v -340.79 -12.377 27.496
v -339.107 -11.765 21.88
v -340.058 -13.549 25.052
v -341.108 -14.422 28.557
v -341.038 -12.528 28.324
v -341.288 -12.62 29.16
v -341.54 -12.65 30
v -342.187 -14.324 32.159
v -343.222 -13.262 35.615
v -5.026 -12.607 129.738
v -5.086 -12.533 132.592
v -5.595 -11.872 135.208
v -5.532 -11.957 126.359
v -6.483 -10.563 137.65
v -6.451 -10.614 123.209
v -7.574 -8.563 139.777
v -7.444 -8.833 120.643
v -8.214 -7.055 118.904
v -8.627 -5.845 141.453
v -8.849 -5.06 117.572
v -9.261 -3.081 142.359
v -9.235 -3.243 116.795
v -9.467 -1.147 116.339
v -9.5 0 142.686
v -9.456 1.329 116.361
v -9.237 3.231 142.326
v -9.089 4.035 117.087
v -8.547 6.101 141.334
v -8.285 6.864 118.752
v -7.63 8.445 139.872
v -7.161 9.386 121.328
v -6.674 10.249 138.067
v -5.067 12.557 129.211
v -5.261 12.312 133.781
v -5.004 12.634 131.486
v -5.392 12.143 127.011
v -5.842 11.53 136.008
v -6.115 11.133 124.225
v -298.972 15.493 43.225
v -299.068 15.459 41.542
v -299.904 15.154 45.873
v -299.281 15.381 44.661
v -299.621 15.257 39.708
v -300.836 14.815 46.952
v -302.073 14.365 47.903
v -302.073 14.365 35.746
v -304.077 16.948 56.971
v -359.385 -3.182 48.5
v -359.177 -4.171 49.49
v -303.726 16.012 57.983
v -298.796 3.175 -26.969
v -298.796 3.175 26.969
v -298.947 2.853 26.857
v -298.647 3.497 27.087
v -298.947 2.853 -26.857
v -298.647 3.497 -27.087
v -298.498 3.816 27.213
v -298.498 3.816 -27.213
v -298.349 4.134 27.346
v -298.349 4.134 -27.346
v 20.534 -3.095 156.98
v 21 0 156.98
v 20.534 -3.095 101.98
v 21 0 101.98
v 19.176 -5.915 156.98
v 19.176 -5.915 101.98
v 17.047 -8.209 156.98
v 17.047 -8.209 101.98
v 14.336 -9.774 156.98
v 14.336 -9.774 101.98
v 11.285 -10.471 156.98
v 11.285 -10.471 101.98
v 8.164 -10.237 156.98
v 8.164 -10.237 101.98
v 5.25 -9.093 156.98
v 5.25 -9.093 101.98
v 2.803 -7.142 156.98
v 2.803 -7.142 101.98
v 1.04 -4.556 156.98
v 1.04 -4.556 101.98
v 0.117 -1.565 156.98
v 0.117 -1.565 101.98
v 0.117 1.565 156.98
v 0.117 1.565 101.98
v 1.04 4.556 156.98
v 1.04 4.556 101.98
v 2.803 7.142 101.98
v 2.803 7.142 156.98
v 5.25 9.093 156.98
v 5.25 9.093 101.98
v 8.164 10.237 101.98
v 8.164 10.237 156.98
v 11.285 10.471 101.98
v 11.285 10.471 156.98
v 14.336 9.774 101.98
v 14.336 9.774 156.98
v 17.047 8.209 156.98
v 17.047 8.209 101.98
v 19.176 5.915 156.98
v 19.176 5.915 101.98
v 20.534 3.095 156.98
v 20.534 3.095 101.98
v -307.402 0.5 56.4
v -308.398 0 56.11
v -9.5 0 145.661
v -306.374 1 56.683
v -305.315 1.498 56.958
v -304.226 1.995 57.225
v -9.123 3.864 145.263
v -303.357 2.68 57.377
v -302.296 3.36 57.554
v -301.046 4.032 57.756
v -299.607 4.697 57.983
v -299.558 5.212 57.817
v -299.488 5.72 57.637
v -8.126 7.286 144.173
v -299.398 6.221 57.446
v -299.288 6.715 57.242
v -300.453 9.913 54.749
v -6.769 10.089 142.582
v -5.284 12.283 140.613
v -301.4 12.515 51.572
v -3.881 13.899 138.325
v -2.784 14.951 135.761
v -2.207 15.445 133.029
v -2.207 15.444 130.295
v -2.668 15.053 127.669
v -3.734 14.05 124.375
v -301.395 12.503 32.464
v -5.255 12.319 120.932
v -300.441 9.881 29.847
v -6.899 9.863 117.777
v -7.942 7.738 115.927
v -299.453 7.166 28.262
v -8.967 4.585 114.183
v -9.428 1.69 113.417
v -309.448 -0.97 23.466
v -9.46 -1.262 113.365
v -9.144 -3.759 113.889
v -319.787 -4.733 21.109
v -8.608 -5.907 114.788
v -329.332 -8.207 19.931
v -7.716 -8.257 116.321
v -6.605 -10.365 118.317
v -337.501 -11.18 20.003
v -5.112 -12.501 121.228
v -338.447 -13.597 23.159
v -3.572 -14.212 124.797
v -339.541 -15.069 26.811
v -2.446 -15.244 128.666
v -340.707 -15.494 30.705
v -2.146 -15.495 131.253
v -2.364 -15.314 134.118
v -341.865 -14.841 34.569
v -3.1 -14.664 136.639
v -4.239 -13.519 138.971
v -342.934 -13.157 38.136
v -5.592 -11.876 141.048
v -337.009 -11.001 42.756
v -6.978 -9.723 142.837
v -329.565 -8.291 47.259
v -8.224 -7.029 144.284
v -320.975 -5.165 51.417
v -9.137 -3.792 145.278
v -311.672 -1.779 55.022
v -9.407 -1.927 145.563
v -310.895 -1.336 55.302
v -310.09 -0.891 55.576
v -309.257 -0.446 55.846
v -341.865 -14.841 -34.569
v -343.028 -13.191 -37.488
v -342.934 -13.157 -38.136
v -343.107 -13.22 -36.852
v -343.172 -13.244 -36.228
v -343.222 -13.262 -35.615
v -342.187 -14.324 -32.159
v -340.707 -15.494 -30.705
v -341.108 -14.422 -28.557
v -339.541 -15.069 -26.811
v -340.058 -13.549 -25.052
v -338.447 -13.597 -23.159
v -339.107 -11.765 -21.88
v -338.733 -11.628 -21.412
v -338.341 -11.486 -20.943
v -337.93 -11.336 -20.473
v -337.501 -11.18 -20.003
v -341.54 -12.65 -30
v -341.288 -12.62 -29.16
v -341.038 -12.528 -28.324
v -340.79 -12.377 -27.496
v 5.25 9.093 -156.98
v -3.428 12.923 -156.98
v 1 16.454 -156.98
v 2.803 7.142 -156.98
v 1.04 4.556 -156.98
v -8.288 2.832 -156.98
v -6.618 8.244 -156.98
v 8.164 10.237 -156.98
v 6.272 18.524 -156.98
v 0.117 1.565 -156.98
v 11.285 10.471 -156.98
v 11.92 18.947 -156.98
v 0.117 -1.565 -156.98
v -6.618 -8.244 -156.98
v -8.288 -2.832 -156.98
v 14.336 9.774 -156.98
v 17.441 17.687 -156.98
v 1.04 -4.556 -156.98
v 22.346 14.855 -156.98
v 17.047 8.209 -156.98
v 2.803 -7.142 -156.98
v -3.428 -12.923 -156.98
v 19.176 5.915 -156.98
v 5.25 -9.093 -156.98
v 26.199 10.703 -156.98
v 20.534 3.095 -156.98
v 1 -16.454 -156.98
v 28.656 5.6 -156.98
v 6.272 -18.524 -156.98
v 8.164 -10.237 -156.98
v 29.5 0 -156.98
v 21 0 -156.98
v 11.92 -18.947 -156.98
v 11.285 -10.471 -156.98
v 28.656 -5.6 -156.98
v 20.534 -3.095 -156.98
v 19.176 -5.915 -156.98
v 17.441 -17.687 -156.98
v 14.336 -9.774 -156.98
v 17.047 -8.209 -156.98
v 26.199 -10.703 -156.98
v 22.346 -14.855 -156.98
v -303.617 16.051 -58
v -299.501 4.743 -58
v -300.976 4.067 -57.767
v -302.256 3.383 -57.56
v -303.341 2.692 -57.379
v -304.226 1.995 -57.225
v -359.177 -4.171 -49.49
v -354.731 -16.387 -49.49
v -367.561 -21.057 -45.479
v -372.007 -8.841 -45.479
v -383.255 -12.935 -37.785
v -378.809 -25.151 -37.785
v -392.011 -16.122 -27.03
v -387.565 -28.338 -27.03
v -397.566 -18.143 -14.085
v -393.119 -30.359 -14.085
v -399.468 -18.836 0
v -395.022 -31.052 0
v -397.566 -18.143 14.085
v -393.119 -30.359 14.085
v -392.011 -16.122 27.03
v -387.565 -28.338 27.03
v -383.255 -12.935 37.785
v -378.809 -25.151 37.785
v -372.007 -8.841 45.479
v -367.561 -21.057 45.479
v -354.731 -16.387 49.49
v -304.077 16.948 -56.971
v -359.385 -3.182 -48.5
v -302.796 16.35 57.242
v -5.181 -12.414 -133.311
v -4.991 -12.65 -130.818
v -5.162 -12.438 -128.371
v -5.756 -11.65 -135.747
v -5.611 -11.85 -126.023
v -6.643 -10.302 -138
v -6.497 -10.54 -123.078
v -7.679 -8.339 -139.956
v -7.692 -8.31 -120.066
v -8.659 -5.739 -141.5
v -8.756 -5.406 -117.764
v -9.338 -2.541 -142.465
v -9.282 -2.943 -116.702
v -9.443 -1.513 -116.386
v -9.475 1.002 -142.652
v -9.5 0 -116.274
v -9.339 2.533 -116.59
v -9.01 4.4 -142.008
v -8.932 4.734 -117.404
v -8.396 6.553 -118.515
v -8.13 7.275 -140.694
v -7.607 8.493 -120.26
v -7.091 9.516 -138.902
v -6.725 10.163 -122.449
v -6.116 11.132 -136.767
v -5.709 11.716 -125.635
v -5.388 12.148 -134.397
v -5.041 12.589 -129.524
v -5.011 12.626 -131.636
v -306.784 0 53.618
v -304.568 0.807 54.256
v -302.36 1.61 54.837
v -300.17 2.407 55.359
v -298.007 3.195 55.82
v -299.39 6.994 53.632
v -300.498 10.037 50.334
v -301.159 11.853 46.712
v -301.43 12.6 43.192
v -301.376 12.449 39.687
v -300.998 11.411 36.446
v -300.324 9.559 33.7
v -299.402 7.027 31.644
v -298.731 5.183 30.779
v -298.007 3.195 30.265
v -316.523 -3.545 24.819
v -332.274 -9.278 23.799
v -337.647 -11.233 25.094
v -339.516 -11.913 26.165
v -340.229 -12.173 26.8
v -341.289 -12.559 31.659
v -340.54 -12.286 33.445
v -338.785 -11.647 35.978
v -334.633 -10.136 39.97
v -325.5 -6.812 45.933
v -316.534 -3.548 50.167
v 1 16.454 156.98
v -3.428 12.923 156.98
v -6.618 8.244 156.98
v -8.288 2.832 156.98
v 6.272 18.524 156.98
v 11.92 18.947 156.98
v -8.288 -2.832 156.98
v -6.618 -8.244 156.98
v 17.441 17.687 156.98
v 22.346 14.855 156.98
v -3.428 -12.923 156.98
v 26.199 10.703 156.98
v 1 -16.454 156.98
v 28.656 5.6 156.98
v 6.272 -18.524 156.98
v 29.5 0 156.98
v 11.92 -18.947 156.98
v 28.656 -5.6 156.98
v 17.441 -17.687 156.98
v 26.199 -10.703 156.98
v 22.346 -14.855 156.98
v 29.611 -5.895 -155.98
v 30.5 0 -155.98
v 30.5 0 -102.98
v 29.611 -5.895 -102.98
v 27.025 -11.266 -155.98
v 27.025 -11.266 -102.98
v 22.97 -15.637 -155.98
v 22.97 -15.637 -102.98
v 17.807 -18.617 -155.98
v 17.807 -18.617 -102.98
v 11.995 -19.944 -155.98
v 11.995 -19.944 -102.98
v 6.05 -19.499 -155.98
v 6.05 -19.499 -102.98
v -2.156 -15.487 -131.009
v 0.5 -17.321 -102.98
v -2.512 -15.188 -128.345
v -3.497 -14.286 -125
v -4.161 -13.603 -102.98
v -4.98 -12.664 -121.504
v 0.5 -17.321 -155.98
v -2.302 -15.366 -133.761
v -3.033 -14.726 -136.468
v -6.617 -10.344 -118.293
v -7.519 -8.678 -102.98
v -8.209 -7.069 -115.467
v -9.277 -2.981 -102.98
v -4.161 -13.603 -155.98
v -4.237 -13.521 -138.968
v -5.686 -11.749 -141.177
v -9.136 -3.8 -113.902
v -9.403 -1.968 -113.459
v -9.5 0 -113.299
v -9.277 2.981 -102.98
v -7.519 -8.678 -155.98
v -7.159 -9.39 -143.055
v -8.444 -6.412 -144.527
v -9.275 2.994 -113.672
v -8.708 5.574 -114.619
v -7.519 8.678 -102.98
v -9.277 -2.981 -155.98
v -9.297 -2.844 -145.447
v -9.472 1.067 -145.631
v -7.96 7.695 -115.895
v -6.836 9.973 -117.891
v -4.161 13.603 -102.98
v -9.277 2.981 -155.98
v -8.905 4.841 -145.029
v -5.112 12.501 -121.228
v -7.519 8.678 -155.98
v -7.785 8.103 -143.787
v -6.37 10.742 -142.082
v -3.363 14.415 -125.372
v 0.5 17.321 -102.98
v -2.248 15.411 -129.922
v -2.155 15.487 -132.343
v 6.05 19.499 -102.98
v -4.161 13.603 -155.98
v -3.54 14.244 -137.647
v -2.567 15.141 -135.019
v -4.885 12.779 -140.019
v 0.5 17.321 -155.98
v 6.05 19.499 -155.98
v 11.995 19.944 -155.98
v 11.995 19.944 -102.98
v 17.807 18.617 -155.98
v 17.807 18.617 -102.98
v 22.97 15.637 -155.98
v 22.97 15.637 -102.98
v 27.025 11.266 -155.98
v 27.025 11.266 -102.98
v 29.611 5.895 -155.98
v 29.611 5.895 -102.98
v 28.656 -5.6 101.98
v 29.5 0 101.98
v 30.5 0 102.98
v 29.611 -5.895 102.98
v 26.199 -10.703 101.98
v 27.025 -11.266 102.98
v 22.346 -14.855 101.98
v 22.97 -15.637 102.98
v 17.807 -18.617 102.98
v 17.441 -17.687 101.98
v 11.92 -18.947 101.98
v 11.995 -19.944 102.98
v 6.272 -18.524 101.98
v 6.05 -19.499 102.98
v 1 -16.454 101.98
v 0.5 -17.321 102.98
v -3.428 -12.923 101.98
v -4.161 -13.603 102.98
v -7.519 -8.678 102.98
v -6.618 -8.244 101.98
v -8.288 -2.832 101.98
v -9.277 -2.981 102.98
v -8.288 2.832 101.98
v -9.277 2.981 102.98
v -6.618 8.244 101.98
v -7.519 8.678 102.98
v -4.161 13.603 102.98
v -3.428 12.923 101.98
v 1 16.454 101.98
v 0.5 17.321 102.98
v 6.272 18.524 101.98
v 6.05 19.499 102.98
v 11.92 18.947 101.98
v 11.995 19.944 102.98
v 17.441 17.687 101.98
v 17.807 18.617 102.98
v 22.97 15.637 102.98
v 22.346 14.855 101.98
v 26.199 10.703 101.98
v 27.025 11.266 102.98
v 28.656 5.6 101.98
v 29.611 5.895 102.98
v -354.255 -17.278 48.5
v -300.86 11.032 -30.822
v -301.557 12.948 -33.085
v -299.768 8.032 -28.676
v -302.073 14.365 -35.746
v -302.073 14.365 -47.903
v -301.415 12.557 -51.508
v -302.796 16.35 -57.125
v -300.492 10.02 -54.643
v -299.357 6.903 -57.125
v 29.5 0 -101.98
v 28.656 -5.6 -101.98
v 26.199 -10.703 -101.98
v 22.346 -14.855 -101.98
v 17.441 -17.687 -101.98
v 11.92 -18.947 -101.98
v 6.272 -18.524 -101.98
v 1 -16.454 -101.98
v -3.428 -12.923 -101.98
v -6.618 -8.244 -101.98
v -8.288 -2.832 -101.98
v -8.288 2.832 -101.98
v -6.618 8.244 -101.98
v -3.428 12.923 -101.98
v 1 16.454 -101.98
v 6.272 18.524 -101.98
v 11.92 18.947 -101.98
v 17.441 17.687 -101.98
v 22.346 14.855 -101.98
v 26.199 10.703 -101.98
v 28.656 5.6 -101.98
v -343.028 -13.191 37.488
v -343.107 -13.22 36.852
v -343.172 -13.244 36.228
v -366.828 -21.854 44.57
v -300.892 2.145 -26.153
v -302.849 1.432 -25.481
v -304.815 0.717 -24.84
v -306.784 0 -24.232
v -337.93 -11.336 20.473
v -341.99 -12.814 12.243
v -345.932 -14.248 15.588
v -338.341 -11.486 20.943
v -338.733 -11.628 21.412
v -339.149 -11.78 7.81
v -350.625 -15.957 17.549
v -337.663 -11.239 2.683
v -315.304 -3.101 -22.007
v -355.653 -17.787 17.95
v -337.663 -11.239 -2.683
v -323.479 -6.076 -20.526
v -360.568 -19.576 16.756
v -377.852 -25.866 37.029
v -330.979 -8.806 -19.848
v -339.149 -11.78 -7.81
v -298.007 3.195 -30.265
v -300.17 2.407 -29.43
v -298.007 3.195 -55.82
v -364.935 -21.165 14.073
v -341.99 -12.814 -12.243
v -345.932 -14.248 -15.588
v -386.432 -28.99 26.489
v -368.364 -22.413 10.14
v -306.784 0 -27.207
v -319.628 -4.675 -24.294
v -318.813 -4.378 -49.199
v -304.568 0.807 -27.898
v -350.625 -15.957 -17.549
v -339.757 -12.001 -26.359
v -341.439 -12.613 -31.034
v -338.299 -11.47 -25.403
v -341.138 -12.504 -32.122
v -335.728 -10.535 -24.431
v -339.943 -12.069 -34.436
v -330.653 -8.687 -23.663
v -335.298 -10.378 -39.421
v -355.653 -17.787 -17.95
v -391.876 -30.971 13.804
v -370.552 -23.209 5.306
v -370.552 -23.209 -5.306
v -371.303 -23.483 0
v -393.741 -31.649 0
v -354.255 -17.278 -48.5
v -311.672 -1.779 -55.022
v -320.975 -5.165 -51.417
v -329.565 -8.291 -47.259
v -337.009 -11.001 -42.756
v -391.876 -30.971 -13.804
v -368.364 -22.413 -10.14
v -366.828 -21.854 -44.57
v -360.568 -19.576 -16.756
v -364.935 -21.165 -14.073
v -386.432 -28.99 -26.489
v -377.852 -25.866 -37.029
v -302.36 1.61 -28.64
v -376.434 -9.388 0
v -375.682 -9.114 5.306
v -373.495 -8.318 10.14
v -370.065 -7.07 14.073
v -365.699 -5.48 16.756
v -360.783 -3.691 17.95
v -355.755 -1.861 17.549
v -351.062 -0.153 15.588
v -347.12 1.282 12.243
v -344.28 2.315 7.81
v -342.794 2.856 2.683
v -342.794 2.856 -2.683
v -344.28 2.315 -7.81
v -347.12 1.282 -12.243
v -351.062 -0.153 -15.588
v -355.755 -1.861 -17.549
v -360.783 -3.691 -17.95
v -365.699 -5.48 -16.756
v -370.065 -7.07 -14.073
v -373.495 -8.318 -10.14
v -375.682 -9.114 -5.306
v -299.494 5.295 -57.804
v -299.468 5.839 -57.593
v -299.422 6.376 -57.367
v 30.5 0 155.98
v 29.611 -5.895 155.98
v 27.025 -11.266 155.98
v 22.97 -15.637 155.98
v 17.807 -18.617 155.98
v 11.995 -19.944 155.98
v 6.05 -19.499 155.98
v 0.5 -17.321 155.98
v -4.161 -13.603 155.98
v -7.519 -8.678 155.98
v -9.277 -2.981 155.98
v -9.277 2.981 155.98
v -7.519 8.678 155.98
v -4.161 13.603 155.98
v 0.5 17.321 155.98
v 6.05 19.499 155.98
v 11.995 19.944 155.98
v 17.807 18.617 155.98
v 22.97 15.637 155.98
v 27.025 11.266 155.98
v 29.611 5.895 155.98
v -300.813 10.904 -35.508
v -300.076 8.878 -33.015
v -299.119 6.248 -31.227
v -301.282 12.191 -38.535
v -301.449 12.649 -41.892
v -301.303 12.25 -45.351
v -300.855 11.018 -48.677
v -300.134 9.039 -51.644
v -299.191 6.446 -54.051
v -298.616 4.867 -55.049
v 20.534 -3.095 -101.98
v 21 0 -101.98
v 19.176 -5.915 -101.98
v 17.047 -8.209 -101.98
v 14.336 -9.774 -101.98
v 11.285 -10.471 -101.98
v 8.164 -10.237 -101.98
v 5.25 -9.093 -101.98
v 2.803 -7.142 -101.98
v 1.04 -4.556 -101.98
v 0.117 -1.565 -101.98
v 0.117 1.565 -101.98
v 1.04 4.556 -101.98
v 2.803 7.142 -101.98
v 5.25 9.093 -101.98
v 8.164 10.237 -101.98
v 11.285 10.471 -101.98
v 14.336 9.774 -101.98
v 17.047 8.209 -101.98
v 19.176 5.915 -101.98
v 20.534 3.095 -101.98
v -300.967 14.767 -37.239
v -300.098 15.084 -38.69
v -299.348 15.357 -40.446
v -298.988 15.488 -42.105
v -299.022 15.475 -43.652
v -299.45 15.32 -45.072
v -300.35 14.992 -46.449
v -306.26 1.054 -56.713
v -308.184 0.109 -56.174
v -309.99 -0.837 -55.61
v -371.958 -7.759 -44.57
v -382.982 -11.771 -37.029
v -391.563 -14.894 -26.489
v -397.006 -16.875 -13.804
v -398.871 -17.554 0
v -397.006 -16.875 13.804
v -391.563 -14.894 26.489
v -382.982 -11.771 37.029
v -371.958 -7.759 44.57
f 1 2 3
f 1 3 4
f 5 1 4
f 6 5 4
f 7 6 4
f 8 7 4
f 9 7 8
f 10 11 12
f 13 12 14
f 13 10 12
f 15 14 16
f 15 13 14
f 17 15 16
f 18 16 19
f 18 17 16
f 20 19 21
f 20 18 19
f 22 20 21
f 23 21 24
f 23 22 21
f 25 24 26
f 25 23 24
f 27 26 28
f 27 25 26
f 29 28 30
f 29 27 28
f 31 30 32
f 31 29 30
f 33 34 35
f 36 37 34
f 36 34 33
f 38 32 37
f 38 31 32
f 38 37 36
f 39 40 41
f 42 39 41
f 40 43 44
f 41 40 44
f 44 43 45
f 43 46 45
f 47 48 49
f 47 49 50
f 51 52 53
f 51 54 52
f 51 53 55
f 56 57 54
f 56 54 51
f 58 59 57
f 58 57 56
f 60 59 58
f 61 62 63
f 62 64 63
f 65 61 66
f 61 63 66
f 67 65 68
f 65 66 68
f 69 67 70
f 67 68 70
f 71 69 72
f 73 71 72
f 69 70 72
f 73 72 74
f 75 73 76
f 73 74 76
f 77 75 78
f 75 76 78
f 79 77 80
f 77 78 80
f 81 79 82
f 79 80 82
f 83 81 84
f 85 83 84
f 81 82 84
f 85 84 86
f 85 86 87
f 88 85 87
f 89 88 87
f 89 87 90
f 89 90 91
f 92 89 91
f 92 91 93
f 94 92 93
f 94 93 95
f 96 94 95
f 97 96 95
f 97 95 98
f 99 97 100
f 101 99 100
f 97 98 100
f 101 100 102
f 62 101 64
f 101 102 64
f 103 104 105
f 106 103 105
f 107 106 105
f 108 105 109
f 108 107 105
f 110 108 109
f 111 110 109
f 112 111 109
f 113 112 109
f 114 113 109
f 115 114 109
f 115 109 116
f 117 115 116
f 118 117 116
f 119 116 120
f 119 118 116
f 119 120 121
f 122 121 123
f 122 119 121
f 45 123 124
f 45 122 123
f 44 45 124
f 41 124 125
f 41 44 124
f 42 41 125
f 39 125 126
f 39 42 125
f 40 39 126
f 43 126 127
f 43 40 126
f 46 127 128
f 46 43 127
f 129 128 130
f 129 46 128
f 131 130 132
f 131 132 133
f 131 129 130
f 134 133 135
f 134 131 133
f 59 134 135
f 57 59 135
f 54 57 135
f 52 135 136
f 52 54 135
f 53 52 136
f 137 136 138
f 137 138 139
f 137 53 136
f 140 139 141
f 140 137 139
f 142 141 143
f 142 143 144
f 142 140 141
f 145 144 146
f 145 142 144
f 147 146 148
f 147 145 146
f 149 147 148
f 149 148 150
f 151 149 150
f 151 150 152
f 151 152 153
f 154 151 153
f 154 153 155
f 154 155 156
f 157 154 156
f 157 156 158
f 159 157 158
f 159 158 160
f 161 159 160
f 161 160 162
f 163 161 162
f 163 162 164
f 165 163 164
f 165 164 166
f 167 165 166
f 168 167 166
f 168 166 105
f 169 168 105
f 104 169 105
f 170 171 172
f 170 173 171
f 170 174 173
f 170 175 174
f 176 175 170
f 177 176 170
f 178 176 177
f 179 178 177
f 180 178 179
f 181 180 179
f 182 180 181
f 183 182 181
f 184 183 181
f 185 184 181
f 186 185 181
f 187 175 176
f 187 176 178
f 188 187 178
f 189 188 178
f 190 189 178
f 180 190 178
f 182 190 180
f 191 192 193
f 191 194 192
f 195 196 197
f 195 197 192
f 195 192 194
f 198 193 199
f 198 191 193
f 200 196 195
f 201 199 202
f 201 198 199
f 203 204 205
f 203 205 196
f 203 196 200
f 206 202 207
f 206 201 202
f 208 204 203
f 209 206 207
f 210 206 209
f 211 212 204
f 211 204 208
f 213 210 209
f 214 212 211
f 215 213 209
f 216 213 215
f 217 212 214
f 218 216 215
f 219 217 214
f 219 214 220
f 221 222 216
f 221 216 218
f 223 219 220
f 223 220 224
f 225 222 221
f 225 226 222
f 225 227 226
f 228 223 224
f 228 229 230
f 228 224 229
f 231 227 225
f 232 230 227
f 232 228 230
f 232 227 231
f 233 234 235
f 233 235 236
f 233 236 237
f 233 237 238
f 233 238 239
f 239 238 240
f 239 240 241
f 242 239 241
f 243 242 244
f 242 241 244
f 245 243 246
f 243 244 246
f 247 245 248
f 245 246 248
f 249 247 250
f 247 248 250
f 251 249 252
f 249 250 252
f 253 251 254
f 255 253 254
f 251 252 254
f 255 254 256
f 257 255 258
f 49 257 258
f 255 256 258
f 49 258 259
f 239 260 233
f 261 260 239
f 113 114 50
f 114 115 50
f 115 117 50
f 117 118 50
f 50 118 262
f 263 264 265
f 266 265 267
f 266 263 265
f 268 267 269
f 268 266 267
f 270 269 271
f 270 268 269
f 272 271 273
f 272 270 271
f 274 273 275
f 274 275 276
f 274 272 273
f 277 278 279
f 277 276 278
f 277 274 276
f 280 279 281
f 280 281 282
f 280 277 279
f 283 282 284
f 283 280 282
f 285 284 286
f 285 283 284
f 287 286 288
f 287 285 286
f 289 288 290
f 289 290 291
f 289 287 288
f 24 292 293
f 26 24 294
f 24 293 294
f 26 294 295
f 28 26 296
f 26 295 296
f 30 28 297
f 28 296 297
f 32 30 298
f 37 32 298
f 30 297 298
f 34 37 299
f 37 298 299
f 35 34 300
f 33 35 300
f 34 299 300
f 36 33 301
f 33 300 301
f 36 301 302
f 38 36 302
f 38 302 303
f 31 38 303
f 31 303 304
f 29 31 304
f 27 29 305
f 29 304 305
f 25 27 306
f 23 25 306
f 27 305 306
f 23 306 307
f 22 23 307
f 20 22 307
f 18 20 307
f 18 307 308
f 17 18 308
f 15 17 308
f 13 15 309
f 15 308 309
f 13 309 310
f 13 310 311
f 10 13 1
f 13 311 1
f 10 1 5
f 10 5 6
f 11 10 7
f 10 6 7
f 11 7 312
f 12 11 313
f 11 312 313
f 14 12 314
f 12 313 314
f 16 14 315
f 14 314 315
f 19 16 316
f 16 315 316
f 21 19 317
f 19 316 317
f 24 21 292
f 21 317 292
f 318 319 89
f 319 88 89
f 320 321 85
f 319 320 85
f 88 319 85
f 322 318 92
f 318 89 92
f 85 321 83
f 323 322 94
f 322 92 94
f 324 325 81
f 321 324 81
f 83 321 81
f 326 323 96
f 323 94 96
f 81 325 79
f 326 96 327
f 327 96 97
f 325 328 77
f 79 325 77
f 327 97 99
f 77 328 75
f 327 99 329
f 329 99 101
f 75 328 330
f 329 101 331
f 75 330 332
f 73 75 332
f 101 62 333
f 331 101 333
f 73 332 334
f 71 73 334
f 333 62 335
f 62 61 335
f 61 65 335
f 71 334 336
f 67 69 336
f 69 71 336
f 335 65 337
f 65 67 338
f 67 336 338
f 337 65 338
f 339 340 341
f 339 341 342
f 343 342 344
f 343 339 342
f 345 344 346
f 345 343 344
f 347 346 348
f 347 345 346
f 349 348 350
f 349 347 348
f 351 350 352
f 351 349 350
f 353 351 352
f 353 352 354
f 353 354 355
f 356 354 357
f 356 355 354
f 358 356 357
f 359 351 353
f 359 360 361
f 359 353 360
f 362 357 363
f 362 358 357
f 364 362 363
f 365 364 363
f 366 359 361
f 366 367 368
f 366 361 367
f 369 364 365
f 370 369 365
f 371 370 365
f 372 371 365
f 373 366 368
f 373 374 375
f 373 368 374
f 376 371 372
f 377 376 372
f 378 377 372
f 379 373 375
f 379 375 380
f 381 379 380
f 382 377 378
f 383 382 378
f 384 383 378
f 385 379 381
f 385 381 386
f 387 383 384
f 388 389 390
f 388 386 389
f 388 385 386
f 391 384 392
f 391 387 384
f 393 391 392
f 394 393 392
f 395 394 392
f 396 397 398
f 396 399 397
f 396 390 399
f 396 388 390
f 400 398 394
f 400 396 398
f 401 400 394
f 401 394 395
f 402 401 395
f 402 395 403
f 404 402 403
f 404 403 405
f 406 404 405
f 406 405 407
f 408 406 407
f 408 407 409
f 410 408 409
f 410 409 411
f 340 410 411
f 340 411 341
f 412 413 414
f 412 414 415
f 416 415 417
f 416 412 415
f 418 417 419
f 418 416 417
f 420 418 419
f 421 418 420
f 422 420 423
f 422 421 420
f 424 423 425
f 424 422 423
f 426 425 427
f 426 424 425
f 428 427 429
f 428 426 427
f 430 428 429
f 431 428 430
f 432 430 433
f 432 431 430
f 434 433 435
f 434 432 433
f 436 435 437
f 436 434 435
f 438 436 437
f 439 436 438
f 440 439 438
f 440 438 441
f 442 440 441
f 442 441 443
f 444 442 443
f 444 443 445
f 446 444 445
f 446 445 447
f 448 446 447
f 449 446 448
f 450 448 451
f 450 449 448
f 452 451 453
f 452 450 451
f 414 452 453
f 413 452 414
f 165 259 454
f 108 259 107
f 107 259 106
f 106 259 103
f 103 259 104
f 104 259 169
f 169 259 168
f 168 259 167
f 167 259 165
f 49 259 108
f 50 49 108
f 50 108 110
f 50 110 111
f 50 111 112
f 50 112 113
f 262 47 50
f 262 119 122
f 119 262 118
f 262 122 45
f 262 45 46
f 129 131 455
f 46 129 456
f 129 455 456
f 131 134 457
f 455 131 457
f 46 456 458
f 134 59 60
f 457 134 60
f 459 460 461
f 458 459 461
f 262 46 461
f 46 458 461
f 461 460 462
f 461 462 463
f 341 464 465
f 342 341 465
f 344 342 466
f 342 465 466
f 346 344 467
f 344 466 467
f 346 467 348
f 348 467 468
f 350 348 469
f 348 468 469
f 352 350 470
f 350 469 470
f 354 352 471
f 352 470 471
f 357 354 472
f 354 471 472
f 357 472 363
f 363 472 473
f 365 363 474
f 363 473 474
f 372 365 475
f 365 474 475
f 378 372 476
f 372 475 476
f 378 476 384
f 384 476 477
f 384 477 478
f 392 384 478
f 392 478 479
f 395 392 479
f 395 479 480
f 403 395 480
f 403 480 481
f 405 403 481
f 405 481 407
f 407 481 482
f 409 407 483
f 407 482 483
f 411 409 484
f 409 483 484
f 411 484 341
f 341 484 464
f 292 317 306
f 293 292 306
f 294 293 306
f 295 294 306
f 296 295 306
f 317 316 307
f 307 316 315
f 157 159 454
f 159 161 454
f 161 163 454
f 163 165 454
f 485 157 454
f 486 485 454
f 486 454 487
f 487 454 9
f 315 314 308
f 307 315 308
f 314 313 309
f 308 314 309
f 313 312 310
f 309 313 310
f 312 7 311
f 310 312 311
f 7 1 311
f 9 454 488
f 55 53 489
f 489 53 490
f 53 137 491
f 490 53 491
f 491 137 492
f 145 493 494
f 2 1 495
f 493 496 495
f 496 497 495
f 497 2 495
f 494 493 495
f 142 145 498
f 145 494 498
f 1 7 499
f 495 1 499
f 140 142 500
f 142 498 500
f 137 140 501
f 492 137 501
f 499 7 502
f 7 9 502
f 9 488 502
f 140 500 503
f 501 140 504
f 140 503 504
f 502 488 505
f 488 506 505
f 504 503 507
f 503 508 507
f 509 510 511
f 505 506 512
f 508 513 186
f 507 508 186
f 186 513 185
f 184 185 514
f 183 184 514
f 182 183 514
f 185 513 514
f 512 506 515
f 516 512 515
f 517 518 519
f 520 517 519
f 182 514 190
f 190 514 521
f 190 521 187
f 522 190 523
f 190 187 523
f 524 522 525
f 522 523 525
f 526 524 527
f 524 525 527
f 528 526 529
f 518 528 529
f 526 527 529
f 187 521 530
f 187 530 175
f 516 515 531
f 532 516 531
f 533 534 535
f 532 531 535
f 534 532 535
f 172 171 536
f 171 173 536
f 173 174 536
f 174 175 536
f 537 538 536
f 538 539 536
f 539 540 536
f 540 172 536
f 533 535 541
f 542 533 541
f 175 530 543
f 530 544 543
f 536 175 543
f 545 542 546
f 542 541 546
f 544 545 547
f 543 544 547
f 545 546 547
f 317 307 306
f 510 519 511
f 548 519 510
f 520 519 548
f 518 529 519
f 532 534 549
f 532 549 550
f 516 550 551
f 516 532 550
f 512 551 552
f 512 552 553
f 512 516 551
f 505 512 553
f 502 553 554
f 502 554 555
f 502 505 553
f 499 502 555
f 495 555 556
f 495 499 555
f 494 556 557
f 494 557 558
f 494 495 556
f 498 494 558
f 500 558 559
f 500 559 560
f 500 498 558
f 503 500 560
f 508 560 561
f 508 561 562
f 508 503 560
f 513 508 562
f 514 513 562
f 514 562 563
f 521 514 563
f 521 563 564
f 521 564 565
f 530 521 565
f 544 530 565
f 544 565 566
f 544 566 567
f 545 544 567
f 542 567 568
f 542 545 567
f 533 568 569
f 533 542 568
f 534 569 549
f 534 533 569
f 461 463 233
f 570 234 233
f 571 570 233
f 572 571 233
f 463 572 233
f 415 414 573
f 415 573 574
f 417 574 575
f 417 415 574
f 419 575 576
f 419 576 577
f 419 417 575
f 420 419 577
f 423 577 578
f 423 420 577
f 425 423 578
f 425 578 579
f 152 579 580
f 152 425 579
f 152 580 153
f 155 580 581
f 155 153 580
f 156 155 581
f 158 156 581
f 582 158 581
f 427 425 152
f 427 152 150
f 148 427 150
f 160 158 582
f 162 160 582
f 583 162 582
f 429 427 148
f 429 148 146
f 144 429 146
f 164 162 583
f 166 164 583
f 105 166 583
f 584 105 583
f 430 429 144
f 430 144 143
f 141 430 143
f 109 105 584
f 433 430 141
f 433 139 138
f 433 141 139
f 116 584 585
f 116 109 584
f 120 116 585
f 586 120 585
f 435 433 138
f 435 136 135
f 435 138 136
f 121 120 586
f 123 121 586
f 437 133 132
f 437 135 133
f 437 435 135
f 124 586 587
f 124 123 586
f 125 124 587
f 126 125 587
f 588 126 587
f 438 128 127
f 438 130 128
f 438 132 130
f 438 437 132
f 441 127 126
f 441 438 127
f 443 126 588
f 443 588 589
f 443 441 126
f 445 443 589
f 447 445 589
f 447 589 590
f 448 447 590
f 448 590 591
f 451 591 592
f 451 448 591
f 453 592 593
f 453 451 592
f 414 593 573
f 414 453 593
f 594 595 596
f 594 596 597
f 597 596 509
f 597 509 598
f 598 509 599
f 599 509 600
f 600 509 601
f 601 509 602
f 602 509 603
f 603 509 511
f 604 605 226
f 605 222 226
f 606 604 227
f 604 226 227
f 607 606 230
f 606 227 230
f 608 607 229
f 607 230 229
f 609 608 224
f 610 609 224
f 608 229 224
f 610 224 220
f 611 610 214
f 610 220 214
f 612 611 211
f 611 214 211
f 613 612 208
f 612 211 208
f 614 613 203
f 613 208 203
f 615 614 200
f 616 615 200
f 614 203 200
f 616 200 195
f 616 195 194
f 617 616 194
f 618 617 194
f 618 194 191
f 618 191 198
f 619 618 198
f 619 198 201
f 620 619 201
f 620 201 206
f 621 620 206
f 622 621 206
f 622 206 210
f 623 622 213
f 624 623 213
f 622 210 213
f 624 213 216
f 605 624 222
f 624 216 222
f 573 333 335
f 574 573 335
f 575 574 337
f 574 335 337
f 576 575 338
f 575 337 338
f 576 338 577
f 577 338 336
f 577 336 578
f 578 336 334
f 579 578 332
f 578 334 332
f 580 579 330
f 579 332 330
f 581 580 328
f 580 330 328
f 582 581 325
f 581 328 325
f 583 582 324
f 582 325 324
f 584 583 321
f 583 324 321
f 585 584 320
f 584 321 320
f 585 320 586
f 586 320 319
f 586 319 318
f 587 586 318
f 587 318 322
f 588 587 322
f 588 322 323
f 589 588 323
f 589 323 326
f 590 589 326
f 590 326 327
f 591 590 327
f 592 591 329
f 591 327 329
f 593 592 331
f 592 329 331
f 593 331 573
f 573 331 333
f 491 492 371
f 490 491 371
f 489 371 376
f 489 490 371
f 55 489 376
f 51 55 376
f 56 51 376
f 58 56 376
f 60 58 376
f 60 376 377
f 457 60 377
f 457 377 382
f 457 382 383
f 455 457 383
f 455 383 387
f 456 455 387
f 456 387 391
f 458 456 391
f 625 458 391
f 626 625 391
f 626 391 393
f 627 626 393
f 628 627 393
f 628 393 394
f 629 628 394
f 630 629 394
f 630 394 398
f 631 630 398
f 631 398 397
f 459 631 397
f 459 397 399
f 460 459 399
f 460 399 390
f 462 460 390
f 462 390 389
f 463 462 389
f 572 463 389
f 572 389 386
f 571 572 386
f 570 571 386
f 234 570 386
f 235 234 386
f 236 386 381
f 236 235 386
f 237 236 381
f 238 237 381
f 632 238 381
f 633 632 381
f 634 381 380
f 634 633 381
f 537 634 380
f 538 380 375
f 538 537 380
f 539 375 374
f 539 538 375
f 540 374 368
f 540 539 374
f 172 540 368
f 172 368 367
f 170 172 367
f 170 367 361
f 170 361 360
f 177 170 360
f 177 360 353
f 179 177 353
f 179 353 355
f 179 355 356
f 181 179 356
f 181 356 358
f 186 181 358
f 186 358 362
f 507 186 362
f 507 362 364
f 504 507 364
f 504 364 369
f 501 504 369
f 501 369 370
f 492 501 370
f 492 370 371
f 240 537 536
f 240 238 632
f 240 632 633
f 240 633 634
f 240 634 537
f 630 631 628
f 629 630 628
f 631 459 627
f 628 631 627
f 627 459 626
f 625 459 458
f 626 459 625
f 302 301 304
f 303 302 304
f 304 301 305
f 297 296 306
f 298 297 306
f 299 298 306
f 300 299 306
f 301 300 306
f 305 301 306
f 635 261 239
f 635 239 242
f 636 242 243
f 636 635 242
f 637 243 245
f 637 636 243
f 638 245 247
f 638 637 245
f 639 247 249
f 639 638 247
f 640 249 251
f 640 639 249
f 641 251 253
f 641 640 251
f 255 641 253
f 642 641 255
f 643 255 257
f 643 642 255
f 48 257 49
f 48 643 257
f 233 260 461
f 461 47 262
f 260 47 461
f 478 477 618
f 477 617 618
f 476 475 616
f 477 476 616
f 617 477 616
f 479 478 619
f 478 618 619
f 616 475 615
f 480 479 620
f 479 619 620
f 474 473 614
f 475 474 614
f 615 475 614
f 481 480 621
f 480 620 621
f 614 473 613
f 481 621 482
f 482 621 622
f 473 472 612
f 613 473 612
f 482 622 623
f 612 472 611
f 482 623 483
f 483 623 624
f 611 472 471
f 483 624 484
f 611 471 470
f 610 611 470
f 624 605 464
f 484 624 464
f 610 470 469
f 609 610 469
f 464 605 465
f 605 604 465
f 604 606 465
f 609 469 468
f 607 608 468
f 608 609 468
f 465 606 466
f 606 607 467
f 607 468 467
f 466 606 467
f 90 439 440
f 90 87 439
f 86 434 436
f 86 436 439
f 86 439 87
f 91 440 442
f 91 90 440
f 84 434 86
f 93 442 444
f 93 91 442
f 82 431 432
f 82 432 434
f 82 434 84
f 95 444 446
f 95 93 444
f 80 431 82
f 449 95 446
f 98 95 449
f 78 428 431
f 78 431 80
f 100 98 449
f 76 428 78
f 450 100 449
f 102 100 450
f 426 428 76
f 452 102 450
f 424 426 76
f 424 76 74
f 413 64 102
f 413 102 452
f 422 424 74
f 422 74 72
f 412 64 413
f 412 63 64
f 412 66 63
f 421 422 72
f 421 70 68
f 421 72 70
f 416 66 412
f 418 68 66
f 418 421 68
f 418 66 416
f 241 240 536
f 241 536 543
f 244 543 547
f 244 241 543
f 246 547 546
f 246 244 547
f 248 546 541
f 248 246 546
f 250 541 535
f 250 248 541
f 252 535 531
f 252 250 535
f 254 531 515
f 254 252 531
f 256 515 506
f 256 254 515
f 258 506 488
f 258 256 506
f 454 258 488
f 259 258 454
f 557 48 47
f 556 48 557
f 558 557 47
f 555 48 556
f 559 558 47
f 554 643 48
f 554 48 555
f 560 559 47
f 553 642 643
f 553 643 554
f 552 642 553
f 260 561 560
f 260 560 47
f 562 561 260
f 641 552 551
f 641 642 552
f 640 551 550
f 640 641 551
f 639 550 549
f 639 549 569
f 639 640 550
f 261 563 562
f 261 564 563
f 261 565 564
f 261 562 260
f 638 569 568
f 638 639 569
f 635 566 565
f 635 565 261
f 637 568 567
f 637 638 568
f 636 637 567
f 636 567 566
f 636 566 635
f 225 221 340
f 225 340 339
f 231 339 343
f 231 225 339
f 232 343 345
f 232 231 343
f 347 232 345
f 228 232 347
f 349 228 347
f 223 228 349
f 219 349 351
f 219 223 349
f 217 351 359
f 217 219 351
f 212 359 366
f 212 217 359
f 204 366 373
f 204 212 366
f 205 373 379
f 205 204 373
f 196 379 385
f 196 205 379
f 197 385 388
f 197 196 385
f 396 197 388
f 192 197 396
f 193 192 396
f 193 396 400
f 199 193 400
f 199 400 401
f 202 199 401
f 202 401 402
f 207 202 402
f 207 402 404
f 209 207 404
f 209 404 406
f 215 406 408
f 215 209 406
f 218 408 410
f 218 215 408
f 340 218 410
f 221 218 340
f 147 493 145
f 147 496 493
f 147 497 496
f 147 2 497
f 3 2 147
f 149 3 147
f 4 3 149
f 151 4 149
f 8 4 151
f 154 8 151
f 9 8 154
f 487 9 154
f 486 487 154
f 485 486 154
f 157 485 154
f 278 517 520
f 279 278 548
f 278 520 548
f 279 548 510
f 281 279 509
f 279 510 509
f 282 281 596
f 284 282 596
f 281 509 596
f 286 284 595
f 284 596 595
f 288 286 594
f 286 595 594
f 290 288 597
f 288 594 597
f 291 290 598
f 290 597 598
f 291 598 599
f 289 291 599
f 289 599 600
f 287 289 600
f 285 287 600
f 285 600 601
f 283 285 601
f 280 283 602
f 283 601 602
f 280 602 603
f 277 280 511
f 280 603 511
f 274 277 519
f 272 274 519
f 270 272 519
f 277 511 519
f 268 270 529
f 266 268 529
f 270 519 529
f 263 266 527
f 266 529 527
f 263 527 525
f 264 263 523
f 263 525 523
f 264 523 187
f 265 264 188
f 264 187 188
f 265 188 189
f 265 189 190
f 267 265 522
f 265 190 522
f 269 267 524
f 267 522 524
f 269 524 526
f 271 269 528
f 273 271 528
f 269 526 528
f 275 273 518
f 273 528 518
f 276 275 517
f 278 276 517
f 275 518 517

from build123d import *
from OCP.BRepFilletAPI import BRepFilletAPI_MakeChamfer

# Parameters (mm, degrees)
SKETCH1_W                = 9.5
SKETCH1_H                = 55
BOSS_EXTRUDE1_REACH      = 418.864
BOSS_EXTRUDE1_END_RADIUS = 20
SKETCH2_R                = 15.5
SKETCH2_R_2              = 12.65
BOSS_EXTRUDE2_REACH      = 418.864
BOSS_EXTRUDE2_END_RADIUS = 20
SKETCH3_R                = 15.5
SKETCH3_R_2              = 12.65
SKETCH9_W                = 200
SKETCH9_H                = 33.234380705
CUT_EXTRUDE2_DEPTH       = 198.5
SKETCH8_R                = 18
BOSS_EXTRUDE3_DEPTH      = 15
CHAMFER1_SIZE            = 1
CHAMFER2_SIZE            = 1
CHAMFER2_SIZE2           = 0.883191486
CHAMFER3_SIZE            = 1


with BuildPart() as part:
    # Sketch1 → Revolve1 (revolve)
    with BuildSketch(Plane(origin=(0, 0, 0), x_dir=(1, 0, 0), z_dir=(0, 1, 0)), mode=Mode.PRIVATE) as revolve1_sk:
        with Locations((-4.75, 129.48)):
            Rectangle(SKETCH1_W, SKETCH1_H)
        with Locations((-4.75, -129.48)):
            Rectangle(SKETCH1_W, SKETCH1_H)
    revolve(revolve1_sk.sketch.rotate(Axis((10.5, 0, -101.98), (0, 0, -1)), 180), axis=Axis((10.5, 0, -101.98), (0, 0, -1)))

    # Boss-Extrude1: up to this cylinder (the profile starts outside it)
    boss_extrude1_end = Plane(origin=(10.5, 0, -44.427968), z_dir=(0, 0, 1)) * Cylinder(BOSS_EXTRUDE1_END_RADIUS, 878.728, mode=Mode.PRIVATE)
    # Sketch2 → Boss-Extrude1 (add, up to the surface)
    with BuildSketch(Plane(origin=(-341.54, 0, -30), x_dir=(0.28699849189640086, 0, 0.9579310338689272), z_dir=(-0.9579310338689272, 0, 0.28699849189640086)), mode=Mode.PRIVATE) as boss_extrude1_sk1:
        Circle(SKETCH2_R)
        Circle(SKETCH2_R_2, mode=Mode.SUBTRACT)
    boss_extrude1_tool1 = extrude(boss_extrude1_sk1.sketch, amount=-BOSS_EXTRUDE1_REACH, mode=Mode.PRIVATE) - boss_extrude1_end
    add(boss_extrude1_tool1.solids().sort_by_distance((-345.862655, 0, -44.427968))[0])

    # Boss-Extrude2: up to this cylinder (the profile starts outside it)
    boss_extrude2_end = Plane(origin=(10.5, 0, 15.572032), z_dir=(0, 0, 1)) * Cylinder(BOSS_EXTRUDE2_END_RADIUS, 878.728, mode=Mode.PRIVATE)
    # Sketch3 → Boss-Extrude2 (add, up to the surface)
    with BuildSketch(Plane(origin=(-341.54, 0, 30), x_dir=(-0.28699849189640053, 0, 0.9579310338689273), z_dir=(-0.9579310338689273, 0, -0.28699849189640053)), mode=Mode.PRIVATE) as boss_extrude2_sk1:
        Circle(SKETCH3_R)
        Circle(SKETCH3_R_2, mode=Mode.SUBTRACT)
    boss_extrude2_tool1 = extrude(boss_extrude2_sk1.sketch, amount=-BOSS_EXTRUDE2_REACH, mode=Mode.PRIVATE) - boss_extrude2_end
    add(boss_extrude2_tool1.solids().sort_by_distance((-337.217345, 0, 15.572032))[0])

    # Sketch9 → Cut-Extrude2 (cut, symmetric)
    with BuildSketch(Plane(origin=(-301.587409551, -109.768840106, 0), x_dir=(0, 0, 1), z_dir=(-0.9396926207859128, -0.34202014332565694, 0))):
        with Locations((0, 133.430750104)):
            Rectangle(SKETCH9_W, SKETCH9_H)
    extrude(amount=CUT_EXTRUDE2_DEPTH, both=True, mode=Mode.SUBTRACT)

    # Sketch8 → Boss-Extrude3 (add)
    with BuildSketch(Plane(origin=(-35.886958817, 98.598609003, 0), x_dir=(0, 0, -1), z_dir=(-0.34202014332565694, 0.9396926207859128, 0))):
        with BuildLine():
            Line((-58.125498382, 278.942617703), (58.125498382, 278.942617703))
            Line((58.125498382, 278.942617703), (49.490055464, 338.942617703))
            ThreePointArc((49.490055464, 338.942617703), (0, 381.819808554), (-49.490055464, 338.942617703))
            Line((-49.490055464, 338.942617703), (-58.125498382, 278.942617703))
        make_face()
        with Locations(Location((0, 338.942617703, 0), (0, 0, 90))):
            Circle(SKETCH8_R, mode=Mode.SUBTRACT)
    extrude(amount=BOSS_EXTRUDE3_DEPTH)

    # Chamfer1
    chamfer1_edges = [part.edges().sort_by_distance(p)[0] for p in [
        (-9.5, 0, -156.98),
        (-9.5, 0, -101.98),
        (-9.5, 0, 101.98),
        (-9.5, 0, 156.98),
    ]]
    chamfer(chamfer1_edges, length=CHAMFER1_SIZE)

    # Chamfer2: one chamfer whose edges measure the first distance from different faces: ONE call of the kernel's chamfer builder (chamfer() names one face for all edges)
    chamfer2_edges_1 = [part.edges().sort_by_distance(p)[0] for p in [
        (-298.007278296, 3.194614917, 0),
        (-303.137580446, 17.290004229, 0),
        (-331.328359069, 7.029399929, -53.807776923),
        (-331.328359069, 7.029399929, 53.807776923),
        (-399.810517535, -17.896067331, 0),
        (-329.918850493, -8.420247491, -53.237897301),
        (-329.918850493, -8.420247491, 53.237897301),
        (-394.680215385, -31.991456643, 0),
    ]]
    chamfer2_edges_2 = [part.edges().sort_by_distance(p)[0] for p in [
        (-300.914930544, 11.183323814, -58.125498382),
    ]]
    chamfer2_side_2 = [part.faces().sort_by_distance(p)[0] for p in [
        (-300.973675486, 11.344724214, 0),
    ]]
    chamfer2_edges_3 = [part.edges().sort_by_distance(p)[0] for p in [
        (-300.914930544, 11.183323814, 58.125498382),
    ]]
    chamfer2_side_3 = [part.faces().sort_by_distance(p)[0] for p in [
        (-329.11686309, -0.055580808, 53.758111659),
    ]]
    chamfer2 = BRepFilletAPI_MakeChamfer(part.part.solid().wrapped)
    for e in chamfer2_edges_1:
        chamfer2.Add(CHAMFER2_SIZE, e.wrapped)
    for e in chamfer2_edges_2:
        chamfer2.Add(CHAMFER2_SIZE, CHAMFER2_SIZE2, e.wrapped, chamfer2_side_2[0].wrapped)  # the first distance lies on this face
    for e in chamfer2_edges_3:
        chamfer2.Add(CHAMFER2_SIZE, CHAMFER2_SIZE2, e.wrapped, chamfer2_side_3[0].wrapped)  # the first distance lies on this face
    add(Compound.cast(chamfer2.Shape()), mode=Mode.REPLACE)

    # Chamfer3
    chamfer3_edges = [part.edges().sort_by_distance(p)[0] for p in [
        (-341.07783166, -15.416120436, -28.457394695),
        (-341.07783166, -15.416120436, 28.457394695),
    ]]
    chamfer(chamfer3_edges, length=CHAMFER3_SIZE)


solid = part.part
